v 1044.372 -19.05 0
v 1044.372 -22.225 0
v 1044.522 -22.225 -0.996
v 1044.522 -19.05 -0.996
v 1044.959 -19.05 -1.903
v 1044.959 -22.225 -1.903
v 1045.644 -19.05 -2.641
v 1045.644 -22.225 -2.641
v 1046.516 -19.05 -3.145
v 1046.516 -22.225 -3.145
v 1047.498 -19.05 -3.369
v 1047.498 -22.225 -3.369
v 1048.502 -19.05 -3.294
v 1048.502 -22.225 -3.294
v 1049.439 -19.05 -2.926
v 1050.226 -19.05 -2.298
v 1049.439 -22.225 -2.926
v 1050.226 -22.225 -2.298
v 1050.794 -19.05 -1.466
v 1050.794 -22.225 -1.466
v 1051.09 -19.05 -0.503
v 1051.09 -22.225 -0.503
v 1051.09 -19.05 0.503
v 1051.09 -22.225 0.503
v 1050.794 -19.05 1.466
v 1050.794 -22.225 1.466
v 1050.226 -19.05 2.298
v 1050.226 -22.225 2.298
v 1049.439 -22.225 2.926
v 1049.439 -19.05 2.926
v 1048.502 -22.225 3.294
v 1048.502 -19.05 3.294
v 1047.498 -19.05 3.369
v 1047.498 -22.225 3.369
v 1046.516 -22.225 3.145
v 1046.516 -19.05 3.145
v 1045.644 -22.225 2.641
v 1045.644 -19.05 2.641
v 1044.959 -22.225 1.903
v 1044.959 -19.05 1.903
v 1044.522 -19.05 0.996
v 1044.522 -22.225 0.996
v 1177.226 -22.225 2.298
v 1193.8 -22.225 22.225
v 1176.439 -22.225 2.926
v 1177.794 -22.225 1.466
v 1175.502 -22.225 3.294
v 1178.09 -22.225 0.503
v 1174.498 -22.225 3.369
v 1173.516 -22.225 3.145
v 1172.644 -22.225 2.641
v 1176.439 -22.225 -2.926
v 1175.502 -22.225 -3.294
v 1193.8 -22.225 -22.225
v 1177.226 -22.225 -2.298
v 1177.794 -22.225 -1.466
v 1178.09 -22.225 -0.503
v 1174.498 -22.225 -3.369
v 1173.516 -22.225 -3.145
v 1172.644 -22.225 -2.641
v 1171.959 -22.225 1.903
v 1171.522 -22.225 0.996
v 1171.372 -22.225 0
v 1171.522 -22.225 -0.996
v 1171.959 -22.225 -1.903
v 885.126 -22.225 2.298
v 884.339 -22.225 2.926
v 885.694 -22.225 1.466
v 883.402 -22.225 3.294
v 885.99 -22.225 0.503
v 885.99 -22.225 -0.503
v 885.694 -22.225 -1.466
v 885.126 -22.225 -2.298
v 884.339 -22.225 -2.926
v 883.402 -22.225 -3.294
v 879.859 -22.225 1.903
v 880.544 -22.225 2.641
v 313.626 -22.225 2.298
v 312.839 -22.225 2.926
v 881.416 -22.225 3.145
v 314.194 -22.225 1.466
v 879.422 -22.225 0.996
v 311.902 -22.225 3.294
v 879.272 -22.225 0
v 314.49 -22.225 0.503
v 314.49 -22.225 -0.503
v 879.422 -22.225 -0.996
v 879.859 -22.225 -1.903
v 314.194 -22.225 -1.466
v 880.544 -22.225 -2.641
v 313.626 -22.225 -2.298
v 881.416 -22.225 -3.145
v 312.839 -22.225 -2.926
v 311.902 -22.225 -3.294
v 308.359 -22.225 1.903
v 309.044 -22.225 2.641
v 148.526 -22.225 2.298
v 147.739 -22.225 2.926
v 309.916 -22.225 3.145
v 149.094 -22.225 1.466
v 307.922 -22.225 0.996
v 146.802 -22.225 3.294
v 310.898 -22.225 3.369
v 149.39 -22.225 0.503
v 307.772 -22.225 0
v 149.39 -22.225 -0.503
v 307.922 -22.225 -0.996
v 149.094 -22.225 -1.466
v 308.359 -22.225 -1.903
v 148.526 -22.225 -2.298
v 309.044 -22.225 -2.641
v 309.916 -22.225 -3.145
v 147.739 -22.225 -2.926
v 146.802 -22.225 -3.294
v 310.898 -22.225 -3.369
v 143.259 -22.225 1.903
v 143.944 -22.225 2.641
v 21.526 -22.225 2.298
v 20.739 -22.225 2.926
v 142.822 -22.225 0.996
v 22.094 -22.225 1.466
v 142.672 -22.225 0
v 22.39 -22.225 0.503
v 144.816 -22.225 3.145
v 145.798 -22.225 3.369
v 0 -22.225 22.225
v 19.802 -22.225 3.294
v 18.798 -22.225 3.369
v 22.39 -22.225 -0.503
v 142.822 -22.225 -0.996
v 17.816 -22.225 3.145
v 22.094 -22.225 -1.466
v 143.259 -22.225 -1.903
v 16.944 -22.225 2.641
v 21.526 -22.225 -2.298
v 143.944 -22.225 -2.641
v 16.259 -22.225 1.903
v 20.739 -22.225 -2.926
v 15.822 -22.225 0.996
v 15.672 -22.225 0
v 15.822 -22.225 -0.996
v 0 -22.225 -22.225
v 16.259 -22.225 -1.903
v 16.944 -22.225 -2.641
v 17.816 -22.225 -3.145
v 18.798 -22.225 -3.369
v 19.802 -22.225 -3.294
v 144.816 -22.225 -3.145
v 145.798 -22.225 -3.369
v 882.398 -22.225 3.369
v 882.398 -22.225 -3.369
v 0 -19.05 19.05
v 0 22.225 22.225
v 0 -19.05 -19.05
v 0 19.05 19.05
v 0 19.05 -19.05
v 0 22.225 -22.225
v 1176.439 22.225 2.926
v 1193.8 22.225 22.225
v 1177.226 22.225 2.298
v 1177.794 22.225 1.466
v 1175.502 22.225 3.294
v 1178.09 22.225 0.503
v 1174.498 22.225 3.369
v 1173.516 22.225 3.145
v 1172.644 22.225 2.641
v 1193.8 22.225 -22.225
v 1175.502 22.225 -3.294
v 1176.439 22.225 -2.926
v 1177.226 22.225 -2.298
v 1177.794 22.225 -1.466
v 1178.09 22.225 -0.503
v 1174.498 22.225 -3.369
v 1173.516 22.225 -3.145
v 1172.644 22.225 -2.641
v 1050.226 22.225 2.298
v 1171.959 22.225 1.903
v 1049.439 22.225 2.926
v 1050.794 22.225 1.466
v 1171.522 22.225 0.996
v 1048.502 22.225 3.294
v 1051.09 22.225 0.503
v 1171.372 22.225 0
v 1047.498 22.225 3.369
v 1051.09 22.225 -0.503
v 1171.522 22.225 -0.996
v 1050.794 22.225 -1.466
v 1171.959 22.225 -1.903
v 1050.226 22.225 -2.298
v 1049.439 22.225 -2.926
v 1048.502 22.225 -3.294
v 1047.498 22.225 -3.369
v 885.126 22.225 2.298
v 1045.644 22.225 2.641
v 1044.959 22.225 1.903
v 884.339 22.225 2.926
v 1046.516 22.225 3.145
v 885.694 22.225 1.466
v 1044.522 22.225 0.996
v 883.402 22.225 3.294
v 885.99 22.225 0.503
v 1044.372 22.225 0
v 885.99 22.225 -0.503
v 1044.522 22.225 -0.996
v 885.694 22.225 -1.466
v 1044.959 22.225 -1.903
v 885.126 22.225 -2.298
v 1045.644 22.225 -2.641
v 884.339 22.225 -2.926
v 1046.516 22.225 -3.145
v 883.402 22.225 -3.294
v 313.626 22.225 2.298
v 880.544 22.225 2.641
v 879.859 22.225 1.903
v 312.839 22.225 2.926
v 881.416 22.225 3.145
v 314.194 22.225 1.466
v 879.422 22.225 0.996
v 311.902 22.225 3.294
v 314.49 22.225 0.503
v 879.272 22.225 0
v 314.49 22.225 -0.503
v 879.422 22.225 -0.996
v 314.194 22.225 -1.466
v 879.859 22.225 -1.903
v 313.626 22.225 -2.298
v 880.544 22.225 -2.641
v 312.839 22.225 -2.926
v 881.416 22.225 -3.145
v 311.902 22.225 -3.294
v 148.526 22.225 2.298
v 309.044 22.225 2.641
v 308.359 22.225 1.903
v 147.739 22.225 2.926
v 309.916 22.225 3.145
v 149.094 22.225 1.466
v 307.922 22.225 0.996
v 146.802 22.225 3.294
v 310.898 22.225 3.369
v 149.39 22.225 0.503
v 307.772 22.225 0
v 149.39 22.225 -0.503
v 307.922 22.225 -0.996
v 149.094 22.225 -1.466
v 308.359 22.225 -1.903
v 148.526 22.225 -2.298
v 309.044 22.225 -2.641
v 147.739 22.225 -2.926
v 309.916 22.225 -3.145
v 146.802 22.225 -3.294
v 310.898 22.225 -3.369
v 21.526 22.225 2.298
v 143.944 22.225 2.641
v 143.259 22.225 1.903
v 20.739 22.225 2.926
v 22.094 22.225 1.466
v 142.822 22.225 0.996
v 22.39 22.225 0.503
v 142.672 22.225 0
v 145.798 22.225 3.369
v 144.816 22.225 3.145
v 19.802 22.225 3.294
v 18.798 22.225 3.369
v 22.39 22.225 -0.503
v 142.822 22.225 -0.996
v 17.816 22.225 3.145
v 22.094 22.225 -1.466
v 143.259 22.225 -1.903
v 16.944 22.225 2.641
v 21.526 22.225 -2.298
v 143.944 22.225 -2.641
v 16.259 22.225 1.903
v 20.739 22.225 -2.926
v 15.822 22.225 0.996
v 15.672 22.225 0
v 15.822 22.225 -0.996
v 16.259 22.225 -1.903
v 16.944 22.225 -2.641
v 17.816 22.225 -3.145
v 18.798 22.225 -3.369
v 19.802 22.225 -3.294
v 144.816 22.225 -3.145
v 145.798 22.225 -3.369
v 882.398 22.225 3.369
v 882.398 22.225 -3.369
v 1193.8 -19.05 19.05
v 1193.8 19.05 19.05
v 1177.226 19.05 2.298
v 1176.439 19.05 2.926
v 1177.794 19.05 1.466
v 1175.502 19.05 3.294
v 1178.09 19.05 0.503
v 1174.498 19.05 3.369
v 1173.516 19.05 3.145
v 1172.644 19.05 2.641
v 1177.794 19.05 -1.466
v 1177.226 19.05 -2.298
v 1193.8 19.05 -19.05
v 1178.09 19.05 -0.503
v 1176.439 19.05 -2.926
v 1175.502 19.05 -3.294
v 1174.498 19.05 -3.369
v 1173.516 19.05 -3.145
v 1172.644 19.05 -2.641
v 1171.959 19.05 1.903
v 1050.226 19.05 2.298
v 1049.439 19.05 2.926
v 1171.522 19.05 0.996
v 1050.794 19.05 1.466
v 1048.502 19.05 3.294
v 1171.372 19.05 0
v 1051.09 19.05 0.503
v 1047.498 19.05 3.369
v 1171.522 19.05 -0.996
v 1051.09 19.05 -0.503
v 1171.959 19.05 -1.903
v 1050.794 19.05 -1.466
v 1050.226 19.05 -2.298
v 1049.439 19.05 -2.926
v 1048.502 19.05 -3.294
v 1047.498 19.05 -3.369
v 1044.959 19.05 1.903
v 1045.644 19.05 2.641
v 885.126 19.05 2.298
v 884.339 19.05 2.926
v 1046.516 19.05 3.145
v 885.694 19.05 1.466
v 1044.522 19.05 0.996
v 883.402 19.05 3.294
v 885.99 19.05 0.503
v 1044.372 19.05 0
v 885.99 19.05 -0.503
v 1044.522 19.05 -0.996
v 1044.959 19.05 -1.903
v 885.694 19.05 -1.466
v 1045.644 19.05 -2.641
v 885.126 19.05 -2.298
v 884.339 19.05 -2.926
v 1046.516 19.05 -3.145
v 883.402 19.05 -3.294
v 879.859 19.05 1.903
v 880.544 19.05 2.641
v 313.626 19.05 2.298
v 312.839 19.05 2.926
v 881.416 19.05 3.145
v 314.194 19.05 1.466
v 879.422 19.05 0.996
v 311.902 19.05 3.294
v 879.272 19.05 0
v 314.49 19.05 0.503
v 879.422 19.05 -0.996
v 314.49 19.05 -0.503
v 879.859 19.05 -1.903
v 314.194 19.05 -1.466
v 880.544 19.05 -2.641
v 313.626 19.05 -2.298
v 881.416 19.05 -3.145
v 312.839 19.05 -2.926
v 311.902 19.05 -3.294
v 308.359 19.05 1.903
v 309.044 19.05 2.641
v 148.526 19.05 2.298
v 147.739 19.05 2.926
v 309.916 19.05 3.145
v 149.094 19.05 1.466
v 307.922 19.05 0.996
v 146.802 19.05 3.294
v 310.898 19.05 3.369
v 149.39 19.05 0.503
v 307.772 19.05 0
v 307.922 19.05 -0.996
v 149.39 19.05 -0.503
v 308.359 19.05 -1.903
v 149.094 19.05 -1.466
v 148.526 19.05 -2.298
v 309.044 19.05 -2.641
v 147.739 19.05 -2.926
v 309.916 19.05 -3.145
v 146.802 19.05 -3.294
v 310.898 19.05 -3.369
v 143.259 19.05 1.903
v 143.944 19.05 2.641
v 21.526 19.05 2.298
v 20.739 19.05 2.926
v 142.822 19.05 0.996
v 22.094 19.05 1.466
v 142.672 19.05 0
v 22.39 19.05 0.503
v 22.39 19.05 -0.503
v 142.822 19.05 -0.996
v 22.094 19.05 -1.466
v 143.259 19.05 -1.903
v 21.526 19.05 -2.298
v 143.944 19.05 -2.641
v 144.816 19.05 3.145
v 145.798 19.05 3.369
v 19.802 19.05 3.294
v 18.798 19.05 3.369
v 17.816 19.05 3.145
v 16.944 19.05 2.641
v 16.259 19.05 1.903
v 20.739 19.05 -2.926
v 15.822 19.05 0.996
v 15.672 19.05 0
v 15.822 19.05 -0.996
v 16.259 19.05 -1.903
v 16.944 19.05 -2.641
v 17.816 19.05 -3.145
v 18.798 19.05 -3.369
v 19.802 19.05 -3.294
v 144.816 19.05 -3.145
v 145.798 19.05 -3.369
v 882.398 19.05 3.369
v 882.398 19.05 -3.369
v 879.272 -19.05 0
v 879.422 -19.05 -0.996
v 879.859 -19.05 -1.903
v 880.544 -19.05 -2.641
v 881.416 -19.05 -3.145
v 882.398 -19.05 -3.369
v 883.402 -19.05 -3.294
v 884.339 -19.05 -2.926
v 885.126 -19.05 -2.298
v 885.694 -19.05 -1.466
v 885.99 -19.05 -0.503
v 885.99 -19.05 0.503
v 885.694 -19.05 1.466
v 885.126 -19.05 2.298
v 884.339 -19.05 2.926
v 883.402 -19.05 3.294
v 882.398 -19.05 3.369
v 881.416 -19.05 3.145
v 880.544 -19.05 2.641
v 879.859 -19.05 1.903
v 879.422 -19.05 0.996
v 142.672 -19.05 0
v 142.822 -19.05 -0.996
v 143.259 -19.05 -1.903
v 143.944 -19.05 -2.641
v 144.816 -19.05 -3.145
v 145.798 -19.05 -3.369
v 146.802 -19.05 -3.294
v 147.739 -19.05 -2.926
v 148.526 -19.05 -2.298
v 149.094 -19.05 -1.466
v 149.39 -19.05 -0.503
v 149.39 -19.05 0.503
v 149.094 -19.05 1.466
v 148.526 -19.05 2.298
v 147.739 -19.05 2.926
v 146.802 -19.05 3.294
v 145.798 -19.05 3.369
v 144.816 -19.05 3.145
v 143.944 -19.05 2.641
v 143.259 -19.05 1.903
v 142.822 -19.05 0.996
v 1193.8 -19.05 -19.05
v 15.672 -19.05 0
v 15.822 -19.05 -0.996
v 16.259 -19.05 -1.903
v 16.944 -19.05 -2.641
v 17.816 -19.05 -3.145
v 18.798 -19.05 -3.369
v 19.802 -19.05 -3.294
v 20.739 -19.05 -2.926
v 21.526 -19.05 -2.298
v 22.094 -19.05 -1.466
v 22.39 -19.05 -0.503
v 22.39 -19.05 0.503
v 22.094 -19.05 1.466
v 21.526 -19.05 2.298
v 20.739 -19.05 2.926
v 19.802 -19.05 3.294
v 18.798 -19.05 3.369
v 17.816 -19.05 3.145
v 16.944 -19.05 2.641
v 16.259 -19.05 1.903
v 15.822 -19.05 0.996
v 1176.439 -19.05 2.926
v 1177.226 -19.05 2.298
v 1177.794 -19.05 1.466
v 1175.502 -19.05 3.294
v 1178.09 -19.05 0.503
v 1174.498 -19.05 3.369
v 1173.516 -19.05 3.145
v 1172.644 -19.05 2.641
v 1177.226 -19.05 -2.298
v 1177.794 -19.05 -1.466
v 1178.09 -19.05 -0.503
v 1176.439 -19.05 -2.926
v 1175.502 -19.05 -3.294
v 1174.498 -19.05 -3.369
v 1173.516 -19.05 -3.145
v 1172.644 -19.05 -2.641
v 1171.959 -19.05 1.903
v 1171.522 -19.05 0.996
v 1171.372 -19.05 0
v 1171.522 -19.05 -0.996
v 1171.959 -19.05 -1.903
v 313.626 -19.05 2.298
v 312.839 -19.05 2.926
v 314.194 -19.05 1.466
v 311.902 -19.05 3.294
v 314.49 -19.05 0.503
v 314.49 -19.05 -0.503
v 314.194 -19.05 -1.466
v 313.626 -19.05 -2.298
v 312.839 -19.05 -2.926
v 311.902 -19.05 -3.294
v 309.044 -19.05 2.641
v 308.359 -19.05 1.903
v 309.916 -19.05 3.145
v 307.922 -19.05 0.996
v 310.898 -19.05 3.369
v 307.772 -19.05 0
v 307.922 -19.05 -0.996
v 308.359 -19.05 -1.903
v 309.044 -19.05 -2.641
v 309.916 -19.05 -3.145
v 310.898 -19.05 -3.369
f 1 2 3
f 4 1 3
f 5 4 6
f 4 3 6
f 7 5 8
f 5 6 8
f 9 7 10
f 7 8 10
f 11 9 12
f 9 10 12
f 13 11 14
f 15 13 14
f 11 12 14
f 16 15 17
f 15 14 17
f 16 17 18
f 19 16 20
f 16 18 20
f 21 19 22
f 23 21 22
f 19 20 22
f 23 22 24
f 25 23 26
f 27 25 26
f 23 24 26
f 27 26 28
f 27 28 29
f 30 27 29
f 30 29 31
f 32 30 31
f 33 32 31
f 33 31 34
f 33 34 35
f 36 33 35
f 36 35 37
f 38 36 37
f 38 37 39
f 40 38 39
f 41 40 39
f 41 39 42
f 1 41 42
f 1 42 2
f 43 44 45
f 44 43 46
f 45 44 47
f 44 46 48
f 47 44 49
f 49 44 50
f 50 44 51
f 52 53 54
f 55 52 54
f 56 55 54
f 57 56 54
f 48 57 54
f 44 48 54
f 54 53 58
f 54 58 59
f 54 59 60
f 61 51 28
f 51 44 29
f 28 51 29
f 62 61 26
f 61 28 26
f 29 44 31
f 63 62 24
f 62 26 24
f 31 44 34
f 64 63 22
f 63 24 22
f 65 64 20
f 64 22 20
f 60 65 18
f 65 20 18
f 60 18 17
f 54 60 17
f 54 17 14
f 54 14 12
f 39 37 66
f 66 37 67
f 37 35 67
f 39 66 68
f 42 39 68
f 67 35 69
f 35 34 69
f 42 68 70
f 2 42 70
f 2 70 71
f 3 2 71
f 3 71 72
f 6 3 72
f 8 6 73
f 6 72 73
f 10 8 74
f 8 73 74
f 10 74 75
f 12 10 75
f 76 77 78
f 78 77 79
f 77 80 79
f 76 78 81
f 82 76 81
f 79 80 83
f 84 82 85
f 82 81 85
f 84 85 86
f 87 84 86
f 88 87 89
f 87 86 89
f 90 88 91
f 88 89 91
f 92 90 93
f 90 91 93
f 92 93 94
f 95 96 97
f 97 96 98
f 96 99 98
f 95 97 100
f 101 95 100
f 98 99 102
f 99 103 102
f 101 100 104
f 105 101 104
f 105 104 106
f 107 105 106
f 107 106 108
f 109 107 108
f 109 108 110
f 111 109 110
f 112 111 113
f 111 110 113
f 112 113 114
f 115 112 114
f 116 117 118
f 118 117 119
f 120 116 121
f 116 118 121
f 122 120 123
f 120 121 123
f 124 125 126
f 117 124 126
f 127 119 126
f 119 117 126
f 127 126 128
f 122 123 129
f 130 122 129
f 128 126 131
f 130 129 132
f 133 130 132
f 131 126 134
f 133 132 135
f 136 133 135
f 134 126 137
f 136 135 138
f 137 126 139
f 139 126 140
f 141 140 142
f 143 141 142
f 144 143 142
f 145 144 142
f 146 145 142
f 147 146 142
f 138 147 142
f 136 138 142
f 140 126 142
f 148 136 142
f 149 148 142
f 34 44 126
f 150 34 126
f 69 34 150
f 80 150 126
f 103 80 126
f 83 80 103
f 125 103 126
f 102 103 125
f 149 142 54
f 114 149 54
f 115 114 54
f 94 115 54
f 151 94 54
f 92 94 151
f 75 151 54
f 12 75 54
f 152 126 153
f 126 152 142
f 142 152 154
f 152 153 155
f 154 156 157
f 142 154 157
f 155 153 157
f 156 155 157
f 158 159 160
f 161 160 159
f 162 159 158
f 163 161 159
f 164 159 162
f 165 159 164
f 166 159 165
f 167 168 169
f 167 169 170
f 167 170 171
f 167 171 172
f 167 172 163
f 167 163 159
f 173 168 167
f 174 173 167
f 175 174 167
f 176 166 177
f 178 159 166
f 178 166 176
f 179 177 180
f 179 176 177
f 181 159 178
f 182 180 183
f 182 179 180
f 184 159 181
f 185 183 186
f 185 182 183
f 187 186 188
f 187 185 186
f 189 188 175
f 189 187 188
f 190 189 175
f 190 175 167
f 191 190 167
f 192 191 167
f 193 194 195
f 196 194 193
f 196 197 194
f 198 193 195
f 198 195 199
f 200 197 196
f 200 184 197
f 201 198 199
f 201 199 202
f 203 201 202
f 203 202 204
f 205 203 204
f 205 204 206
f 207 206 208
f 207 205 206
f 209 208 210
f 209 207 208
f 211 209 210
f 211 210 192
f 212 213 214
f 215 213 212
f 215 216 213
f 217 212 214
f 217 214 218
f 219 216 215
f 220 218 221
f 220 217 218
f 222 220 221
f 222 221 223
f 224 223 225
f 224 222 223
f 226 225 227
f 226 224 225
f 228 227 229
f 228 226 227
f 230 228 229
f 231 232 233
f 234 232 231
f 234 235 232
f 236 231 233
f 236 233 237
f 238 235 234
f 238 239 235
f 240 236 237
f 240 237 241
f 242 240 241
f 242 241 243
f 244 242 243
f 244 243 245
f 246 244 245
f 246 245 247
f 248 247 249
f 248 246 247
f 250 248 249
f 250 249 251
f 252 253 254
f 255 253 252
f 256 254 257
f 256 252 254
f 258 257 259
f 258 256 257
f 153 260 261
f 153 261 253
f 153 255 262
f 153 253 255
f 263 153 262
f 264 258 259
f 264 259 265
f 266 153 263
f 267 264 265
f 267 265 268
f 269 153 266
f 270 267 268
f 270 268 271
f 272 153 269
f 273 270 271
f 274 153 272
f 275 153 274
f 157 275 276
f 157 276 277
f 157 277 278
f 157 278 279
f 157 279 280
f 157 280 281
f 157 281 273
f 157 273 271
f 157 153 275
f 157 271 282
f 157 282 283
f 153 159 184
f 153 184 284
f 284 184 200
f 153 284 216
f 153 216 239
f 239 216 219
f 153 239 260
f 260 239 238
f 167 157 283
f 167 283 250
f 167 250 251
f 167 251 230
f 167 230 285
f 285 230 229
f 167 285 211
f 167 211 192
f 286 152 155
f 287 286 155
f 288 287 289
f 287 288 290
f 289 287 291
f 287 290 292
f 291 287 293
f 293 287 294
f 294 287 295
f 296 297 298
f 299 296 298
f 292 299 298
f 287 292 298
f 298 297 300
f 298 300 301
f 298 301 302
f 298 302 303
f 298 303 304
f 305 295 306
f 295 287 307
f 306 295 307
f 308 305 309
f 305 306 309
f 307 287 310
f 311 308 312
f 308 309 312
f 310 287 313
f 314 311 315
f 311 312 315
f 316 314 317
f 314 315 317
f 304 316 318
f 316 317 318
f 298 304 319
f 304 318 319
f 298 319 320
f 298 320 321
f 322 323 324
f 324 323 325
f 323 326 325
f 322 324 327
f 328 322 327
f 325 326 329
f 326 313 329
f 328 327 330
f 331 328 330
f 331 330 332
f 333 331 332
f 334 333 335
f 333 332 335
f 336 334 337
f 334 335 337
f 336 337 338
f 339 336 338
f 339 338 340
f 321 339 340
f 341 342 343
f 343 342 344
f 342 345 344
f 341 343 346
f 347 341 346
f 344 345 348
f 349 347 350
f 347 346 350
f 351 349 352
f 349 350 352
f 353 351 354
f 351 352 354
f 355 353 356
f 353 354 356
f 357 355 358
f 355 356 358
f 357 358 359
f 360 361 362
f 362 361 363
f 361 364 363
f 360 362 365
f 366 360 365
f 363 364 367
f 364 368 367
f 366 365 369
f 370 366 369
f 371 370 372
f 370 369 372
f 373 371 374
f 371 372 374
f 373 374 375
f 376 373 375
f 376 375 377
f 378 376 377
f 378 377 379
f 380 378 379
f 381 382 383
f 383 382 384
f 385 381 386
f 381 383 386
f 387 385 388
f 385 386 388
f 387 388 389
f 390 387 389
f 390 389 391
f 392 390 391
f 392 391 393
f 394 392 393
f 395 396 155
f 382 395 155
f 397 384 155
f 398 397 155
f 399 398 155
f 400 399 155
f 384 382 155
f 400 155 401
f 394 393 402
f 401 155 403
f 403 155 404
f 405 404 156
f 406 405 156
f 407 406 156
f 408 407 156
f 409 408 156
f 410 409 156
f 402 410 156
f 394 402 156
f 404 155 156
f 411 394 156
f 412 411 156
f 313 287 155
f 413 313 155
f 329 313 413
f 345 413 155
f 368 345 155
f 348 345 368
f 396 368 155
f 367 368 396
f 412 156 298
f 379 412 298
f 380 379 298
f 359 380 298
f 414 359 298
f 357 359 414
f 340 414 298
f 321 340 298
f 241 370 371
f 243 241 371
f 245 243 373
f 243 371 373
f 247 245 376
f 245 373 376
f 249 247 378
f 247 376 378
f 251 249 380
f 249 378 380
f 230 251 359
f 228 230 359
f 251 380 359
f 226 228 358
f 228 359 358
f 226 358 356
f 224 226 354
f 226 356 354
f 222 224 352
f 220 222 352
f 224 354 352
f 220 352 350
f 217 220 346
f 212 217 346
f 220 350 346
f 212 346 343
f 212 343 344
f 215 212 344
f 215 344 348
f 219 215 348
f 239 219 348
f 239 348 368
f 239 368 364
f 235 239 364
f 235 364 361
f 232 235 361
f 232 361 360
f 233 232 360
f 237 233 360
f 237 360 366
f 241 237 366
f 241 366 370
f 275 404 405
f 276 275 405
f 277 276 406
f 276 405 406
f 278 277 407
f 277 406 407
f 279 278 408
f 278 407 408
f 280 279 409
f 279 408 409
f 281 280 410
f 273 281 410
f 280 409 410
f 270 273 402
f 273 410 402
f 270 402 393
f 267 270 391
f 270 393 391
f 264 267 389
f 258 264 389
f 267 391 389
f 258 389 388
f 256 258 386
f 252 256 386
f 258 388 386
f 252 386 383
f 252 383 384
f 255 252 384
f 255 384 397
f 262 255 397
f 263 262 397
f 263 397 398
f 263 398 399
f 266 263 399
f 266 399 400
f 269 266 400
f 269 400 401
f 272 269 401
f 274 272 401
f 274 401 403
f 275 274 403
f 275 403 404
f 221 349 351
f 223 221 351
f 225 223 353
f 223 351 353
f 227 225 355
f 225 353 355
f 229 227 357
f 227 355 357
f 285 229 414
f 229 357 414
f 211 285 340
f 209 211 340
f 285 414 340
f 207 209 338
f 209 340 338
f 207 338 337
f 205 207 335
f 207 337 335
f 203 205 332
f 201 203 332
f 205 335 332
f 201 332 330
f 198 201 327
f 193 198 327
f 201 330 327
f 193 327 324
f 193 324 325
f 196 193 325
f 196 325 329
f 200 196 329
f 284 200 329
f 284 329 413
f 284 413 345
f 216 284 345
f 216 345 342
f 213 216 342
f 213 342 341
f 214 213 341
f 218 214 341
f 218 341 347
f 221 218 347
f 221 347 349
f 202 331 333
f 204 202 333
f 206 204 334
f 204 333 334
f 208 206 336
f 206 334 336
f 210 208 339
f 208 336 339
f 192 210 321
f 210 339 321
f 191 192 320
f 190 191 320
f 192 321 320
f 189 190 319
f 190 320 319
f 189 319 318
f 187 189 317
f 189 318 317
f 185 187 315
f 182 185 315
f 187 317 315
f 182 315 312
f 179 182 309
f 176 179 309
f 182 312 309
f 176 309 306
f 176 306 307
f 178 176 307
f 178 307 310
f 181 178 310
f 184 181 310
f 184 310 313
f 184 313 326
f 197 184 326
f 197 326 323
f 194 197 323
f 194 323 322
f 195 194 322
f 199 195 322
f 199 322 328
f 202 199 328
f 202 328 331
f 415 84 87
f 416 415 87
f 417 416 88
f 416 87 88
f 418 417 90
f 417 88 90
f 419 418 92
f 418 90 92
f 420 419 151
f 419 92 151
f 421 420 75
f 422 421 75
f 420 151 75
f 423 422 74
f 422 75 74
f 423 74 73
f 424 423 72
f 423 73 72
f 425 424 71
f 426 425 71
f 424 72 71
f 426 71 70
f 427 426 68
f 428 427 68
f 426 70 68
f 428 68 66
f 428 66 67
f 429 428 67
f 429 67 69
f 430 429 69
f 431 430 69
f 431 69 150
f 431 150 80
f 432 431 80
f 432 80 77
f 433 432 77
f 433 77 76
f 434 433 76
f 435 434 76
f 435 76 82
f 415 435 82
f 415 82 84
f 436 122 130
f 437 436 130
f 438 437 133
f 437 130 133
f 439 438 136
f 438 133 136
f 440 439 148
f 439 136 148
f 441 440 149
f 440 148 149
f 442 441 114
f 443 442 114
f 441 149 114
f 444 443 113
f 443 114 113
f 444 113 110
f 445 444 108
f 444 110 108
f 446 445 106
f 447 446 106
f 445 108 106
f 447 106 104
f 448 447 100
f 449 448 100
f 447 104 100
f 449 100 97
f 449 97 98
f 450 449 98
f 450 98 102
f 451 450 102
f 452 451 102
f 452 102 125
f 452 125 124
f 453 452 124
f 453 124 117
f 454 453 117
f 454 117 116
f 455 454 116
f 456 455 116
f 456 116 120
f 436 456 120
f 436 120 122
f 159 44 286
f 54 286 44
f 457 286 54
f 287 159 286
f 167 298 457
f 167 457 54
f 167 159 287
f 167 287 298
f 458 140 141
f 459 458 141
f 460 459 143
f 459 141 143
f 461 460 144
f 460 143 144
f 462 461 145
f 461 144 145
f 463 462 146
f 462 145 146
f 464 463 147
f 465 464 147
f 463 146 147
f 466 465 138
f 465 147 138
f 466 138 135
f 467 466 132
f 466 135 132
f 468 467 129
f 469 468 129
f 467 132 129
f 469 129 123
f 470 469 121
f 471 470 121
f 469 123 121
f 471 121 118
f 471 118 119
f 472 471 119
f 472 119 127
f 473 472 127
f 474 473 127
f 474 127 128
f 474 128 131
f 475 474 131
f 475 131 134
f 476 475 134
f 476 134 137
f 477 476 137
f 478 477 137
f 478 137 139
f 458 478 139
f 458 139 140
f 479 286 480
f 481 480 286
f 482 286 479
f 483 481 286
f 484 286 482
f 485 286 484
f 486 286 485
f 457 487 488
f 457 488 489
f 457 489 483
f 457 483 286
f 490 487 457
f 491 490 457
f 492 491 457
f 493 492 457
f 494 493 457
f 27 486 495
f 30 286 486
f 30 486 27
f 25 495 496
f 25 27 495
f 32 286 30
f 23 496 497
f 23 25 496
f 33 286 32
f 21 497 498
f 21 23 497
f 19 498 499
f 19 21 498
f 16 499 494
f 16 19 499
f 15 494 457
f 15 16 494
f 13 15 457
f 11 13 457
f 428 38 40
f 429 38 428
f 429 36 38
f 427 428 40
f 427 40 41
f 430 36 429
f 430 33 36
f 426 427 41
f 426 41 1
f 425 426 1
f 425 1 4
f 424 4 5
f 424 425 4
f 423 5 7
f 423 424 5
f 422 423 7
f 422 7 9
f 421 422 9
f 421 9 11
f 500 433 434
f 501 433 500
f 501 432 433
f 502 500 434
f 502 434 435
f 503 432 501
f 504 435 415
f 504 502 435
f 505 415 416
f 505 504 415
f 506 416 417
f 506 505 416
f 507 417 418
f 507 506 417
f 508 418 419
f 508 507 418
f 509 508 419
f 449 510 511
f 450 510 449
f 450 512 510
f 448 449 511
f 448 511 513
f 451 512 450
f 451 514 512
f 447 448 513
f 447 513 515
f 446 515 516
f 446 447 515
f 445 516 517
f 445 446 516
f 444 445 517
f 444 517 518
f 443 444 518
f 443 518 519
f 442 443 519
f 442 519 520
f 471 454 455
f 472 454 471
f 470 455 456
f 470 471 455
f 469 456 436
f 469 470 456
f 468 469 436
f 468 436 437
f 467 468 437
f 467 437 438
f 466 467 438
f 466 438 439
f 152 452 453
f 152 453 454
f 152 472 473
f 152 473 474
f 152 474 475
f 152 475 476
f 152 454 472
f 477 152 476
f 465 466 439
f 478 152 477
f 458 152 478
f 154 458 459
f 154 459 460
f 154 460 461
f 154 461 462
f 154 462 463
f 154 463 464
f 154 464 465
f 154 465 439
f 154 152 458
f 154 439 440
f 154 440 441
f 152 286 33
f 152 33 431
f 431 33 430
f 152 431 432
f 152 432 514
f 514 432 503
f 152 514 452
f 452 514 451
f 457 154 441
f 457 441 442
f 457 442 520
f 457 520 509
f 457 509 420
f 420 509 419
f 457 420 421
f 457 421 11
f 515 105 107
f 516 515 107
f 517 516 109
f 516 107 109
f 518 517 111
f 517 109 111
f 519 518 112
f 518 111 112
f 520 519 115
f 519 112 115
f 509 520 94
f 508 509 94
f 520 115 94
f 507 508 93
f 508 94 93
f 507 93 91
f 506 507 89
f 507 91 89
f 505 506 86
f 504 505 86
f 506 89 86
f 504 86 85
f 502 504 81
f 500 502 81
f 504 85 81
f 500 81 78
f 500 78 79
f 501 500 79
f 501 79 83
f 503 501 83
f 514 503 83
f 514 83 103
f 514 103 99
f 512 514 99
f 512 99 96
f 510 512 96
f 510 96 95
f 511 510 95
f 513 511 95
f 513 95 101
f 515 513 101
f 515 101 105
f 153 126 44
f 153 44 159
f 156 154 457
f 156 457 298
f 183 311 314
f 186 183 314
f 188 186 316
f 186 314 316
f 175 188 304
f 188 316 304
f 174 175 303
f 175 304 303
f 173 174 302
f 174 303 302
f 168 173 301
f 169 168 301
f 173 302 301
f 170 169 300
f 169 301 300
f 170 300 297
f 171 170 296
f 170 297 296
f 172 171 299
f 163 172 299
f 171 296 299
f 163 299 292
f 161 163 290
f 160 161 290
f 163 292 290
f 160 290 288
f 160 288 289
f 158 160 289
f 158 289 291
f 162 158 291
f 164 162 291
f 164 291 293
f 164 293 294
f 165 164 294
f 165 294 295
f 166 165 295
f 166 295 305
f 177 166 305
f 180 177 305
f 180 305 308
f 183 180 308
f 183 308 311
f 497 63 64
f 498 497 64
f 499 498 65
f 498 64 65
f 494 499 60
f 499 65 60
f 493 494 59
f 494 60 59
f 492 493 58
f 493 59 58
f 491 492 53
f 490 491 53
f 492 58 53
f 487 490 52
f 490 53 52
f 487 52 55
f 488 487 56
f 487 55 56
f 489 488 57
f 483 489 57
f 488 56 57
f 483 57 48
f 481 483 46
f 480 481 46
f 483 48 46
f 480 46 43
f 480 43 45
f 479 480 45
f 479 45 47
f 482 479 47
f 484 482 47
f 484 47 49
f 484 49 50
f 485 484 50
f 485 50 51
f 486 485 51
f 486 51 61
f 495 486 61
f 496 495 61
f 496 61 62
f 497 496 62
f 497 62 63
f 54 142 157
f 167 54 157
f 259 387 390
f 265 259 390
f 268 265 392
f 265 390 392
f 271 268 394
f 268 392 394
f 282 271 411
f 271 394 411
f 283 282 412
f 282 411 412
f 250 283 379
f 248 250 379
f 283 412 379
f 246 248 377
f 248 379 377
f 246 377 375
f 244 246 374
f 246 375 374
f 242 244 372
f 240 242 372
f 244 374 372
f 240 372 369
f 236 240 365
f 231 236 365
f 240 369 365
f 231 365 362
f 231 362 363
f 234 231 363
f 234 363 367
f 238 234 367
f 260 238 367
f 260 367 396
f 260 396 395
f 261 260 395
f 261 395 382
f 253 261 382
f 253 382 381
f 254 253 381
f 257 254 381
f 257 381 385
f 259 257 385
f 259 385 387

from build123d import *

# Parameters (mm, degrees)
SKETCH1_W               = 44.45
SKETCH1_H               = 44.45
SKETCH1_W_2             = 38.1
SKETCH1_H_2             = 38.1
BOSS_EXTRUDE1_DEPTH     = 1193.8
F_1_4_CLEARANCE_HOLE1_D = 6.7564


with BuildPart() as part:
    # Sketch1 → Boss-Extrude1 (new body)
    with BuildSketch(Plane(origin=(0, 0, 0), x_dir=(0, 0, -1), z_dir=(1, 0, 0))):
        Rectangle(SKETCH1_W, SKETCH1_H)
        Rectangle(SKETCH1_W_2, SKETCH1_H_2, mode=Mode.SUBTRACT)
    extrude(amount=BOSS_EXTRUDE1_DEPTH)

    # 1/4 Clearance Hole1 (through all)
    with Locations(Plane(origin=(0, 22.225, 0), x_dir=(1, 0, 0), z_dir=(0, 1, 0))):
        with Locations((311.15, 0), (146.05, 0), (19.05, 0), (1174.75, 0), (1047.75, 0), (882.65, 0)):
            Hole(F_1_4_CLEARANCE_HOLE1_D / 2)


solid = part.part
